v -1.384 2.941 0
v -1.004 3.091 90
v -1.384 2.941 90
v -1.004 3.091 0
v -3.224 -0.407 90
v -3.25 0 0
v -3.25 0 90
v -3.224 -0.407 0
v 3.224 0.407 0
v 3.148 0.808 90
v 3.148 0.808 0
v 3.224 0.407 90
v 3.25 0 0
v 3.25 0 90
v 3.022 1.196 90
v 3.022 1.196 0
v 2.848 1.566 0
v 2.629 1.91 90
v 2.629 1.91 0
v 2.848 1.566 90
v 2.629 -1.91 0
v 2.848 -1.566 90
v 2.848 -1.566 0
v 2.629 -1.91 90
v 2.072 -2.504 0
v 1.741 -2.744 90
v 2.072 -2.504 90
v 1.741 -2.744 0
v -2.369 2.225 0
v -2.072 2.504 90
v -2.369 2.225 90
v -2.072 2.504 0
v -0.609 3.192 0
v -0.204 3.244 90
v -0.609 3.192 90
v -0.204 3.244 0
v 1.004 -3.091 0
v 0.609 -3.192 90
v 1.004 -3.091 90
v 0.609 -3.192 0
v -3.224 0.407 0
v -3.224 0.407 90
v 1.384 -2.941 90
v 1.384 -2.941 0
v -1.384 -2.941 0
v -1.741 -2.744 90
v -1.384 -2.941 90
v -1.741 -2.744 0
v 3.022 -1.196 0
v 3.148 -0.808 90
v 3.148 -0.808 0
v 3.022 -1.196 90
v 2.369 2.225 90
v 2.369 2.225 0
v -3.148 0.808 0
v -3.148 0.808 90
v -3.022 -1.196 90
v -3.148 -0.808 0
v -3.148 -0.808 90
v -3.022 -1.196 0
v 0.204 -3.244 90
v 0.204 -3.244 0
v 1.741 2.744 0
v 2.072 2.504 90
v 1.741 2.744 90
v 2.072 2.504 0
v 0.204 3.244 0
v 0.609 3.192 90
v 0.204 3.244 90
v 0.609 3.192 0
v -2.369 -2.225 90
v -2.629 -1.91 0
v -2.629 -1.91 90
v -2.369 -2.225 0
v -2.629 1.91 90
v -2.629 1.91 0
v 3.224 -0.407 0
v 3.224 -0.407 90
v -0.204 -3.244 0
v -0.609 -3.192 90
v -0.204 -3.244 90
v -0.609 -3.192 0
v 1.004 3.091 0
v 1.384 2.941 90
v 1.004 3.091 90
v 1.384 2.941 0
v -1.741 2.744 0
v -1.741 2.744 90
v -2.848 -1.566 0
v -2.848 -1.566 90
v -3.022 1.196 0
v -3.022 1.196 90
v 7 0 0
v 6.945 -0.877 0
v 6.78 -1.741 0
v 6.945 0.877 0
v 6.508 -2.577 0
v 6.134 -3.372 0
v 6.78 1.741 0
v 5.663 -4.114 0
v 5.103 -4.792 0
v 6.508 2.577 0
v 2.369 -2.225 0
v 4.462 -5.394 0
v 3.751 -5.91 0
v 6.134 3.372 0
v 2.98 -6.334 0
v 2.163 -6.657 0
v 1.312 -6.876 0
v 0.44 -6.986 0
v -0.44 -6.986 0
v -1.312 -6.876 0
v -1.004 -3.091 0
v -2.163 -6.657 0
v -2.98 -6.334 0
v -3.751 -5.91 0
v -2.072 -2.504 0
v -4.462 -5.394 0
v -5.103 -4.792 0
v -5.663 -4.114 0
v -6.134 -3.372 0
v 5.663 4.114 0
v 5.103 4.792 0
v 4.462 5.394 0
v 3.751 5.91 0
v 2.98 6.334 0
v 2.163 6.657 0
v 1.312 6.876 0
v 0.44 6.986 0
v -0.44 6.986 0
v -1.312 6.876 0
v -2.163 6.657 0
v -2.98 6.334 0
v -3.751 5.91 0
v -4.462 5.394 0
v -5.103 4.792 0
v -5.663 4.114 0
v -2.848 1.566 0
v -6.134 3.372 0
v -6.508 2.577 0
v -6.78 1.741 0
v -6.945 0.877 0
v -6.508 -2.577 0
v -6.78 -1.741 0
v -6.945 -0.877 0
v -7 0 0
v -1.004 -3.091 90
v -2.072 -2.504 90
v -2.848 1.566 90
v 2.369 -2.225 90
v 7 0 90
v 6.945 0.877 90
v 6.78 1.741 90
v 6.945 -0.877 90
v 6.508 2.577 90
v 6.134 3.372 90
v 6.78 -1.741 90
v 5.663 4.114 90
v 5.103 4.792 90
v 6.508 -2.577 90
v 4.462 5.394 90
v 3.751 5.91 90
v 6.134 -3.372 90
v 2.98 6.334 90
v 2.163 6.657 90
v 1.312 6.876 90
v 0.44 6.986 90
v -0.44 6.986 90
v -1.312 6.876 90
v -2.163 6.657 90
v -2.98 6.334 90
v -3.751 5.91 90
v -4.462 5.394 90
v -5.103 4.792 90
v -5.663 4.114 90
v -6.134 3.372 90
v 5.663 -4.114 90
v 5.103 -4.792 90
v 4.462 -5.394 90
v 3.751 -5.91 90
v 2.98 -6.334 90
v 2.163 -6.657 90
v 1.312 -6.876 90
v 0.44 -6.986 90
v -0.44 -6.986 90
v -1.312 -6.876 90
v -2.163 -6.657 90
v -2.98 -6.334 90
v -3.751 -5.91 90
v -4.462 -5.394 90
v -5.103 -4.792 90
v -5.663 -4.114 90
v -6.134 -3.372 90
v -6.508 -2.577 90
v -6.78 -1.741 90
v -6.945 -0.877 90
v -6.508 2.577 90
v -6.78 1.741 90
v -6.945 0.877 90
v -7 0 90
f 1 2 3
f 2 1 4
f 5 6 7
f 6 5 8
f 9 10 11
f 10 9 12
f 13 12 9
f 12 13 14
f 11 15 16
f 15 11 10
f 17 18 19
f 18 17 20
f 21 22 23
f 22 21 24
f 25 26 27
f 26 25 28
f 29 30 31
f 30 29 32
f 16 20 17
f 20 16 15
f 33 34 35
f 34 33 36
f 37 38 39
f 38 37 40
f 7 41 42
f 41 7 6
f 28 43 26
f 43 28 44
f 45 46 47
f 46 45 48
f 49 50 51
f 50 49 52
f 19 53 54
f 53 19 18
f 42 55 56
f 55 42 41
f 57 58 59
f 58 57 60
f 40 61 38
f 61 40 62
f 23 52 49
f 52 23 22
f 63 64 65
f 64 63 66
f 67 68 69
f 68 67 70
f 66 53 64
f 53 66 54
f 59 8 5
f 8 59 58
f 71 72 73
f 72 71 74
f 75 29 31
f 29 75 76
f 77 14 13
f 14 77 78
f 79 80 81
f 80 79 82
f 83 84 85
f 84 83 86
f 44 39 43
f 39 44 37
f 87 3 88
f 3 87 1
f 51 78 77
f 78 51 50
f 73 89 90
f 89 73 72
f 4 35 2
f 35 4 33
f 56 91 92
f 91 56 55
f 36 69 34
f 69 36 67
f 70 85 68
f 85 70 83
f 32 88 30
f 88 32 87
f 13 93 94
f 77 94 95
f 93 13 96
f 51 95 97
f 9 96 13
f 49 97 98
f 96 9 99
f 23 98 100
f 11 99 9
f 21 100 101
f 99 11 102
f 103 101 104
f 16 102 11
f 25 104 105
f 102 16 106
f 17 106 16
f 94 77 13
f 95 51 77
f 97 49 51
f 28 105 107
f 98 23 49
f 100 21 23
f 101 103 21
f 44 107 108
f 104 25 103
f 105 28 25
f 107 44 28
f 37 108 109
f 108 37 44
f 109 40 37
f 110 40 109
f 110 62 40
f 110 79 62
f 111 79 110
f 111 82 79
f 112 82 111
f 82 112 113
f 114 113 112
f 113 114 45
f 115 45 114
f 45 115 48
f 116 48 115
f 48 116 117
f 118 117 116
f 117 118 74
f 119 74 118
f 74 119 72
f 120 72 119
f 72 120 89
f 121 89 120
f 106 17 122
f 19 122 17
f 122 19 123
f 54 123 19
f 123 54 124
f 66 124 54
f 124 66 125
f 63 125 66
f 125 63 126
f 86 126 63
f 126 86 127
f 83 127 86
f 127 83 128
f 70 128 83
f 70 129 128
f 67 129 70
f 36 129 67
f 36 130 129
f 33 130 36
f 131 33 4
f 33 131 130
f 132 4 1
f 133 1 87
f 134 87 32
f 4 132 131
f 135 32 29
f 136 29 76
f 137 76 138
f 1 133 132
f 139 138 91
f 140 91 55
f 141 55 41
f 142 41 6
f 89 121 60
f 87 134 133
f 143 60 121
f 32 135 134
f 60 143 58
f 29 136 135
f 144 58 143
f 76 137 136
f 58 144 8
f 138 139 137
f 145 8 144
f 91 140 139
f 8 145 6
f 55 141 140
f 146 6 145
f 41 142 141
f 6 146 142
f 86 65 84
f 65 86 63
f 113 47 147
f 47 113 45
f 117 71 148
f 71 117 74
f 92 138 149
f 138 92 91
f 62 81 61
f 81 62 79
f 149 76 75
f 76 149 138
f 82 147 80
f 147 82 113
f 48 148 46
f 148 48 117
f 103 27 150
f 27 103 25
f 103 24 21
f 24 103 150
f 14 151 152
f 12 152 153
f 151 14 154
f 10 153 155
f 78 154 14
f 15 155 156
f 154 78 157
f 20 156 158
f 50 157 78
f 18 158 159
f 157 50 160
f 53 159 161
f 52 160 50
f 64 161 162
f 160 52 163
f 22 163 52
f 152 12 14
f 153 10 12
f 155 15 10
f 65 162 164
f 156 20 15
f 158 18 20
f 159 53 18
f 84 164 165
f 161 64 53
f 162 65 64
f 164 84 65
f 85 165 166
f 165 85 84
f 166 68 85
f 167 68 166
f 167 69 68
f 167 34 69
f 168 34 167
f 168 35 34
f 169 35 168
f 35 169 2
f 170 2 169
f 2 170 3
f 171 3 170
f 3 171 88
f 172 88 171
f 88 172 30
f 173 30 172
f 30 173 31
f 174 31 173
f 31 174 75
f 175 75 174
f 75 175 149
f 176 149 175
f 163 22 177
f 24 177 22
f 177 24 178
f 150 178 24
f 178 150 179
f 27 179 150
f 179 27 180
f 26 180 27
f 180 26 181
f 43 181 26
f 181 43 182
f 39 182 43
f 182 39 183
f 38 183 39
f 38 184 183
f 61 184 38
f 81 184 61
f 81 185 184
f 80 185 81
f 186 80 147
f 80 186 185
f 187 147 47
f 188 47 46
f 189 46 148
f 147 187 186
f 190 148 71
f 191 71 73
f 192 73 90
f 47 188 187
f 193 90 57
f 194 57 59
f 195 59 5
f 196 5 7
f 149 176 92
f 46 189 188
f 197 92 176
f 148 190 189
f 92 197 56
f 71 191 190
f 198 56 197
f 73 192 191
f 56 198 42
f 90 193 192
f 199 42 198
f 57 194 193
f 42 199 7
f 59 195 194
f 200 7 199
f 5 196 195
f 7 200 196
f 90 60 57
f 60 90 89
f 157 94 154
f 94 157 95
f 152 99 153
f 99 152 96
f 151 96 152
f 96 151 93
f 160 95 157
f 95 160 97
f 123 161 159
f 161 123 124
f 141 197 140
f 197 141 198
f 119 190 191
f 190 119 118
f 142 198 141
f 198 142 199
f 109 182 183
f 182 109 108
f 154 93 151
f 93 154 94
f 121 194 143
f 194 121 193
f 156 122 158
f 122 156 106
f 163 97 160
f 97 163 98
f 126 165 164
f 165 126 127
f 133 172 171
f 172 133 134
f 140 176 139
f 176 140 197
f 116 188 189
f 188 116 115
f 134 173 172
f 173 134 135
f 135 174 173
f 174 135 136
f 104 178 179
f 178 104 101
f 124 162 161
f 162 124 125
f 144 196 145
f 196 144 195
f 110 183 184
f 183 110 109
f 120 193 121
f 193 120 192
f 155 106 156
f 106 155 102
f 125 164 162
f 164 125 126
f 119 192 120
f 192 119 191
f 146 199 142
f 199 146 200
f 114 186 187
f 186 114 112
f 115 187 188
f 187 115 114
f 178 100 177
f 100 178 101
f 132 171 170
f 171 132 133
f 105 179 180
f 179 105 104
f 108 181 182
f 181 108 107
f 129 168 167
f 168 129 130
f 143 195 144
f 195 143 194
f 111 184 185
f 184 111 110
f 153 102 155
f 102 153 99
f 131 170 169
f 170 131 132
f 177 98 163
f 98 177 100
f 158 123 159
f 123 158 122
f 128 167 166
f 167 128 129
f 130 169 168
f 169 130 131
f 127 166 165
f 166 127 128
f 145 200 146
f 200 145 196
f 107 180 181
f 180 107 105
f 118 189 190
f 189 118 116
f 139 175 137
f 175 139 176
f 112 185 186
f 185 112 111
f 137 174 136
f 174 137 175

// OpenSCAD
$fn = 50;


difference() {
	union() {
		cylinder(h = 90, r = 7.0000000000);
	}
	union() {
		cylinder(h = 90, r = 3.2500000000);
		cylinder(h = 90, r = 3.2500000000);
		cylinder(h = 90, r = 1.8000000000);
		cylinder(h = 90, r = 1.8000000000);
		cylinder(h = 90, r = 1.8000000000);
		cylinder(h = 90, r = 1.8000000000);
		cylinder(h = 90, r = 1.8000000000);
		cylinder(h = 90, r = 1.8000000000);
	}
}
